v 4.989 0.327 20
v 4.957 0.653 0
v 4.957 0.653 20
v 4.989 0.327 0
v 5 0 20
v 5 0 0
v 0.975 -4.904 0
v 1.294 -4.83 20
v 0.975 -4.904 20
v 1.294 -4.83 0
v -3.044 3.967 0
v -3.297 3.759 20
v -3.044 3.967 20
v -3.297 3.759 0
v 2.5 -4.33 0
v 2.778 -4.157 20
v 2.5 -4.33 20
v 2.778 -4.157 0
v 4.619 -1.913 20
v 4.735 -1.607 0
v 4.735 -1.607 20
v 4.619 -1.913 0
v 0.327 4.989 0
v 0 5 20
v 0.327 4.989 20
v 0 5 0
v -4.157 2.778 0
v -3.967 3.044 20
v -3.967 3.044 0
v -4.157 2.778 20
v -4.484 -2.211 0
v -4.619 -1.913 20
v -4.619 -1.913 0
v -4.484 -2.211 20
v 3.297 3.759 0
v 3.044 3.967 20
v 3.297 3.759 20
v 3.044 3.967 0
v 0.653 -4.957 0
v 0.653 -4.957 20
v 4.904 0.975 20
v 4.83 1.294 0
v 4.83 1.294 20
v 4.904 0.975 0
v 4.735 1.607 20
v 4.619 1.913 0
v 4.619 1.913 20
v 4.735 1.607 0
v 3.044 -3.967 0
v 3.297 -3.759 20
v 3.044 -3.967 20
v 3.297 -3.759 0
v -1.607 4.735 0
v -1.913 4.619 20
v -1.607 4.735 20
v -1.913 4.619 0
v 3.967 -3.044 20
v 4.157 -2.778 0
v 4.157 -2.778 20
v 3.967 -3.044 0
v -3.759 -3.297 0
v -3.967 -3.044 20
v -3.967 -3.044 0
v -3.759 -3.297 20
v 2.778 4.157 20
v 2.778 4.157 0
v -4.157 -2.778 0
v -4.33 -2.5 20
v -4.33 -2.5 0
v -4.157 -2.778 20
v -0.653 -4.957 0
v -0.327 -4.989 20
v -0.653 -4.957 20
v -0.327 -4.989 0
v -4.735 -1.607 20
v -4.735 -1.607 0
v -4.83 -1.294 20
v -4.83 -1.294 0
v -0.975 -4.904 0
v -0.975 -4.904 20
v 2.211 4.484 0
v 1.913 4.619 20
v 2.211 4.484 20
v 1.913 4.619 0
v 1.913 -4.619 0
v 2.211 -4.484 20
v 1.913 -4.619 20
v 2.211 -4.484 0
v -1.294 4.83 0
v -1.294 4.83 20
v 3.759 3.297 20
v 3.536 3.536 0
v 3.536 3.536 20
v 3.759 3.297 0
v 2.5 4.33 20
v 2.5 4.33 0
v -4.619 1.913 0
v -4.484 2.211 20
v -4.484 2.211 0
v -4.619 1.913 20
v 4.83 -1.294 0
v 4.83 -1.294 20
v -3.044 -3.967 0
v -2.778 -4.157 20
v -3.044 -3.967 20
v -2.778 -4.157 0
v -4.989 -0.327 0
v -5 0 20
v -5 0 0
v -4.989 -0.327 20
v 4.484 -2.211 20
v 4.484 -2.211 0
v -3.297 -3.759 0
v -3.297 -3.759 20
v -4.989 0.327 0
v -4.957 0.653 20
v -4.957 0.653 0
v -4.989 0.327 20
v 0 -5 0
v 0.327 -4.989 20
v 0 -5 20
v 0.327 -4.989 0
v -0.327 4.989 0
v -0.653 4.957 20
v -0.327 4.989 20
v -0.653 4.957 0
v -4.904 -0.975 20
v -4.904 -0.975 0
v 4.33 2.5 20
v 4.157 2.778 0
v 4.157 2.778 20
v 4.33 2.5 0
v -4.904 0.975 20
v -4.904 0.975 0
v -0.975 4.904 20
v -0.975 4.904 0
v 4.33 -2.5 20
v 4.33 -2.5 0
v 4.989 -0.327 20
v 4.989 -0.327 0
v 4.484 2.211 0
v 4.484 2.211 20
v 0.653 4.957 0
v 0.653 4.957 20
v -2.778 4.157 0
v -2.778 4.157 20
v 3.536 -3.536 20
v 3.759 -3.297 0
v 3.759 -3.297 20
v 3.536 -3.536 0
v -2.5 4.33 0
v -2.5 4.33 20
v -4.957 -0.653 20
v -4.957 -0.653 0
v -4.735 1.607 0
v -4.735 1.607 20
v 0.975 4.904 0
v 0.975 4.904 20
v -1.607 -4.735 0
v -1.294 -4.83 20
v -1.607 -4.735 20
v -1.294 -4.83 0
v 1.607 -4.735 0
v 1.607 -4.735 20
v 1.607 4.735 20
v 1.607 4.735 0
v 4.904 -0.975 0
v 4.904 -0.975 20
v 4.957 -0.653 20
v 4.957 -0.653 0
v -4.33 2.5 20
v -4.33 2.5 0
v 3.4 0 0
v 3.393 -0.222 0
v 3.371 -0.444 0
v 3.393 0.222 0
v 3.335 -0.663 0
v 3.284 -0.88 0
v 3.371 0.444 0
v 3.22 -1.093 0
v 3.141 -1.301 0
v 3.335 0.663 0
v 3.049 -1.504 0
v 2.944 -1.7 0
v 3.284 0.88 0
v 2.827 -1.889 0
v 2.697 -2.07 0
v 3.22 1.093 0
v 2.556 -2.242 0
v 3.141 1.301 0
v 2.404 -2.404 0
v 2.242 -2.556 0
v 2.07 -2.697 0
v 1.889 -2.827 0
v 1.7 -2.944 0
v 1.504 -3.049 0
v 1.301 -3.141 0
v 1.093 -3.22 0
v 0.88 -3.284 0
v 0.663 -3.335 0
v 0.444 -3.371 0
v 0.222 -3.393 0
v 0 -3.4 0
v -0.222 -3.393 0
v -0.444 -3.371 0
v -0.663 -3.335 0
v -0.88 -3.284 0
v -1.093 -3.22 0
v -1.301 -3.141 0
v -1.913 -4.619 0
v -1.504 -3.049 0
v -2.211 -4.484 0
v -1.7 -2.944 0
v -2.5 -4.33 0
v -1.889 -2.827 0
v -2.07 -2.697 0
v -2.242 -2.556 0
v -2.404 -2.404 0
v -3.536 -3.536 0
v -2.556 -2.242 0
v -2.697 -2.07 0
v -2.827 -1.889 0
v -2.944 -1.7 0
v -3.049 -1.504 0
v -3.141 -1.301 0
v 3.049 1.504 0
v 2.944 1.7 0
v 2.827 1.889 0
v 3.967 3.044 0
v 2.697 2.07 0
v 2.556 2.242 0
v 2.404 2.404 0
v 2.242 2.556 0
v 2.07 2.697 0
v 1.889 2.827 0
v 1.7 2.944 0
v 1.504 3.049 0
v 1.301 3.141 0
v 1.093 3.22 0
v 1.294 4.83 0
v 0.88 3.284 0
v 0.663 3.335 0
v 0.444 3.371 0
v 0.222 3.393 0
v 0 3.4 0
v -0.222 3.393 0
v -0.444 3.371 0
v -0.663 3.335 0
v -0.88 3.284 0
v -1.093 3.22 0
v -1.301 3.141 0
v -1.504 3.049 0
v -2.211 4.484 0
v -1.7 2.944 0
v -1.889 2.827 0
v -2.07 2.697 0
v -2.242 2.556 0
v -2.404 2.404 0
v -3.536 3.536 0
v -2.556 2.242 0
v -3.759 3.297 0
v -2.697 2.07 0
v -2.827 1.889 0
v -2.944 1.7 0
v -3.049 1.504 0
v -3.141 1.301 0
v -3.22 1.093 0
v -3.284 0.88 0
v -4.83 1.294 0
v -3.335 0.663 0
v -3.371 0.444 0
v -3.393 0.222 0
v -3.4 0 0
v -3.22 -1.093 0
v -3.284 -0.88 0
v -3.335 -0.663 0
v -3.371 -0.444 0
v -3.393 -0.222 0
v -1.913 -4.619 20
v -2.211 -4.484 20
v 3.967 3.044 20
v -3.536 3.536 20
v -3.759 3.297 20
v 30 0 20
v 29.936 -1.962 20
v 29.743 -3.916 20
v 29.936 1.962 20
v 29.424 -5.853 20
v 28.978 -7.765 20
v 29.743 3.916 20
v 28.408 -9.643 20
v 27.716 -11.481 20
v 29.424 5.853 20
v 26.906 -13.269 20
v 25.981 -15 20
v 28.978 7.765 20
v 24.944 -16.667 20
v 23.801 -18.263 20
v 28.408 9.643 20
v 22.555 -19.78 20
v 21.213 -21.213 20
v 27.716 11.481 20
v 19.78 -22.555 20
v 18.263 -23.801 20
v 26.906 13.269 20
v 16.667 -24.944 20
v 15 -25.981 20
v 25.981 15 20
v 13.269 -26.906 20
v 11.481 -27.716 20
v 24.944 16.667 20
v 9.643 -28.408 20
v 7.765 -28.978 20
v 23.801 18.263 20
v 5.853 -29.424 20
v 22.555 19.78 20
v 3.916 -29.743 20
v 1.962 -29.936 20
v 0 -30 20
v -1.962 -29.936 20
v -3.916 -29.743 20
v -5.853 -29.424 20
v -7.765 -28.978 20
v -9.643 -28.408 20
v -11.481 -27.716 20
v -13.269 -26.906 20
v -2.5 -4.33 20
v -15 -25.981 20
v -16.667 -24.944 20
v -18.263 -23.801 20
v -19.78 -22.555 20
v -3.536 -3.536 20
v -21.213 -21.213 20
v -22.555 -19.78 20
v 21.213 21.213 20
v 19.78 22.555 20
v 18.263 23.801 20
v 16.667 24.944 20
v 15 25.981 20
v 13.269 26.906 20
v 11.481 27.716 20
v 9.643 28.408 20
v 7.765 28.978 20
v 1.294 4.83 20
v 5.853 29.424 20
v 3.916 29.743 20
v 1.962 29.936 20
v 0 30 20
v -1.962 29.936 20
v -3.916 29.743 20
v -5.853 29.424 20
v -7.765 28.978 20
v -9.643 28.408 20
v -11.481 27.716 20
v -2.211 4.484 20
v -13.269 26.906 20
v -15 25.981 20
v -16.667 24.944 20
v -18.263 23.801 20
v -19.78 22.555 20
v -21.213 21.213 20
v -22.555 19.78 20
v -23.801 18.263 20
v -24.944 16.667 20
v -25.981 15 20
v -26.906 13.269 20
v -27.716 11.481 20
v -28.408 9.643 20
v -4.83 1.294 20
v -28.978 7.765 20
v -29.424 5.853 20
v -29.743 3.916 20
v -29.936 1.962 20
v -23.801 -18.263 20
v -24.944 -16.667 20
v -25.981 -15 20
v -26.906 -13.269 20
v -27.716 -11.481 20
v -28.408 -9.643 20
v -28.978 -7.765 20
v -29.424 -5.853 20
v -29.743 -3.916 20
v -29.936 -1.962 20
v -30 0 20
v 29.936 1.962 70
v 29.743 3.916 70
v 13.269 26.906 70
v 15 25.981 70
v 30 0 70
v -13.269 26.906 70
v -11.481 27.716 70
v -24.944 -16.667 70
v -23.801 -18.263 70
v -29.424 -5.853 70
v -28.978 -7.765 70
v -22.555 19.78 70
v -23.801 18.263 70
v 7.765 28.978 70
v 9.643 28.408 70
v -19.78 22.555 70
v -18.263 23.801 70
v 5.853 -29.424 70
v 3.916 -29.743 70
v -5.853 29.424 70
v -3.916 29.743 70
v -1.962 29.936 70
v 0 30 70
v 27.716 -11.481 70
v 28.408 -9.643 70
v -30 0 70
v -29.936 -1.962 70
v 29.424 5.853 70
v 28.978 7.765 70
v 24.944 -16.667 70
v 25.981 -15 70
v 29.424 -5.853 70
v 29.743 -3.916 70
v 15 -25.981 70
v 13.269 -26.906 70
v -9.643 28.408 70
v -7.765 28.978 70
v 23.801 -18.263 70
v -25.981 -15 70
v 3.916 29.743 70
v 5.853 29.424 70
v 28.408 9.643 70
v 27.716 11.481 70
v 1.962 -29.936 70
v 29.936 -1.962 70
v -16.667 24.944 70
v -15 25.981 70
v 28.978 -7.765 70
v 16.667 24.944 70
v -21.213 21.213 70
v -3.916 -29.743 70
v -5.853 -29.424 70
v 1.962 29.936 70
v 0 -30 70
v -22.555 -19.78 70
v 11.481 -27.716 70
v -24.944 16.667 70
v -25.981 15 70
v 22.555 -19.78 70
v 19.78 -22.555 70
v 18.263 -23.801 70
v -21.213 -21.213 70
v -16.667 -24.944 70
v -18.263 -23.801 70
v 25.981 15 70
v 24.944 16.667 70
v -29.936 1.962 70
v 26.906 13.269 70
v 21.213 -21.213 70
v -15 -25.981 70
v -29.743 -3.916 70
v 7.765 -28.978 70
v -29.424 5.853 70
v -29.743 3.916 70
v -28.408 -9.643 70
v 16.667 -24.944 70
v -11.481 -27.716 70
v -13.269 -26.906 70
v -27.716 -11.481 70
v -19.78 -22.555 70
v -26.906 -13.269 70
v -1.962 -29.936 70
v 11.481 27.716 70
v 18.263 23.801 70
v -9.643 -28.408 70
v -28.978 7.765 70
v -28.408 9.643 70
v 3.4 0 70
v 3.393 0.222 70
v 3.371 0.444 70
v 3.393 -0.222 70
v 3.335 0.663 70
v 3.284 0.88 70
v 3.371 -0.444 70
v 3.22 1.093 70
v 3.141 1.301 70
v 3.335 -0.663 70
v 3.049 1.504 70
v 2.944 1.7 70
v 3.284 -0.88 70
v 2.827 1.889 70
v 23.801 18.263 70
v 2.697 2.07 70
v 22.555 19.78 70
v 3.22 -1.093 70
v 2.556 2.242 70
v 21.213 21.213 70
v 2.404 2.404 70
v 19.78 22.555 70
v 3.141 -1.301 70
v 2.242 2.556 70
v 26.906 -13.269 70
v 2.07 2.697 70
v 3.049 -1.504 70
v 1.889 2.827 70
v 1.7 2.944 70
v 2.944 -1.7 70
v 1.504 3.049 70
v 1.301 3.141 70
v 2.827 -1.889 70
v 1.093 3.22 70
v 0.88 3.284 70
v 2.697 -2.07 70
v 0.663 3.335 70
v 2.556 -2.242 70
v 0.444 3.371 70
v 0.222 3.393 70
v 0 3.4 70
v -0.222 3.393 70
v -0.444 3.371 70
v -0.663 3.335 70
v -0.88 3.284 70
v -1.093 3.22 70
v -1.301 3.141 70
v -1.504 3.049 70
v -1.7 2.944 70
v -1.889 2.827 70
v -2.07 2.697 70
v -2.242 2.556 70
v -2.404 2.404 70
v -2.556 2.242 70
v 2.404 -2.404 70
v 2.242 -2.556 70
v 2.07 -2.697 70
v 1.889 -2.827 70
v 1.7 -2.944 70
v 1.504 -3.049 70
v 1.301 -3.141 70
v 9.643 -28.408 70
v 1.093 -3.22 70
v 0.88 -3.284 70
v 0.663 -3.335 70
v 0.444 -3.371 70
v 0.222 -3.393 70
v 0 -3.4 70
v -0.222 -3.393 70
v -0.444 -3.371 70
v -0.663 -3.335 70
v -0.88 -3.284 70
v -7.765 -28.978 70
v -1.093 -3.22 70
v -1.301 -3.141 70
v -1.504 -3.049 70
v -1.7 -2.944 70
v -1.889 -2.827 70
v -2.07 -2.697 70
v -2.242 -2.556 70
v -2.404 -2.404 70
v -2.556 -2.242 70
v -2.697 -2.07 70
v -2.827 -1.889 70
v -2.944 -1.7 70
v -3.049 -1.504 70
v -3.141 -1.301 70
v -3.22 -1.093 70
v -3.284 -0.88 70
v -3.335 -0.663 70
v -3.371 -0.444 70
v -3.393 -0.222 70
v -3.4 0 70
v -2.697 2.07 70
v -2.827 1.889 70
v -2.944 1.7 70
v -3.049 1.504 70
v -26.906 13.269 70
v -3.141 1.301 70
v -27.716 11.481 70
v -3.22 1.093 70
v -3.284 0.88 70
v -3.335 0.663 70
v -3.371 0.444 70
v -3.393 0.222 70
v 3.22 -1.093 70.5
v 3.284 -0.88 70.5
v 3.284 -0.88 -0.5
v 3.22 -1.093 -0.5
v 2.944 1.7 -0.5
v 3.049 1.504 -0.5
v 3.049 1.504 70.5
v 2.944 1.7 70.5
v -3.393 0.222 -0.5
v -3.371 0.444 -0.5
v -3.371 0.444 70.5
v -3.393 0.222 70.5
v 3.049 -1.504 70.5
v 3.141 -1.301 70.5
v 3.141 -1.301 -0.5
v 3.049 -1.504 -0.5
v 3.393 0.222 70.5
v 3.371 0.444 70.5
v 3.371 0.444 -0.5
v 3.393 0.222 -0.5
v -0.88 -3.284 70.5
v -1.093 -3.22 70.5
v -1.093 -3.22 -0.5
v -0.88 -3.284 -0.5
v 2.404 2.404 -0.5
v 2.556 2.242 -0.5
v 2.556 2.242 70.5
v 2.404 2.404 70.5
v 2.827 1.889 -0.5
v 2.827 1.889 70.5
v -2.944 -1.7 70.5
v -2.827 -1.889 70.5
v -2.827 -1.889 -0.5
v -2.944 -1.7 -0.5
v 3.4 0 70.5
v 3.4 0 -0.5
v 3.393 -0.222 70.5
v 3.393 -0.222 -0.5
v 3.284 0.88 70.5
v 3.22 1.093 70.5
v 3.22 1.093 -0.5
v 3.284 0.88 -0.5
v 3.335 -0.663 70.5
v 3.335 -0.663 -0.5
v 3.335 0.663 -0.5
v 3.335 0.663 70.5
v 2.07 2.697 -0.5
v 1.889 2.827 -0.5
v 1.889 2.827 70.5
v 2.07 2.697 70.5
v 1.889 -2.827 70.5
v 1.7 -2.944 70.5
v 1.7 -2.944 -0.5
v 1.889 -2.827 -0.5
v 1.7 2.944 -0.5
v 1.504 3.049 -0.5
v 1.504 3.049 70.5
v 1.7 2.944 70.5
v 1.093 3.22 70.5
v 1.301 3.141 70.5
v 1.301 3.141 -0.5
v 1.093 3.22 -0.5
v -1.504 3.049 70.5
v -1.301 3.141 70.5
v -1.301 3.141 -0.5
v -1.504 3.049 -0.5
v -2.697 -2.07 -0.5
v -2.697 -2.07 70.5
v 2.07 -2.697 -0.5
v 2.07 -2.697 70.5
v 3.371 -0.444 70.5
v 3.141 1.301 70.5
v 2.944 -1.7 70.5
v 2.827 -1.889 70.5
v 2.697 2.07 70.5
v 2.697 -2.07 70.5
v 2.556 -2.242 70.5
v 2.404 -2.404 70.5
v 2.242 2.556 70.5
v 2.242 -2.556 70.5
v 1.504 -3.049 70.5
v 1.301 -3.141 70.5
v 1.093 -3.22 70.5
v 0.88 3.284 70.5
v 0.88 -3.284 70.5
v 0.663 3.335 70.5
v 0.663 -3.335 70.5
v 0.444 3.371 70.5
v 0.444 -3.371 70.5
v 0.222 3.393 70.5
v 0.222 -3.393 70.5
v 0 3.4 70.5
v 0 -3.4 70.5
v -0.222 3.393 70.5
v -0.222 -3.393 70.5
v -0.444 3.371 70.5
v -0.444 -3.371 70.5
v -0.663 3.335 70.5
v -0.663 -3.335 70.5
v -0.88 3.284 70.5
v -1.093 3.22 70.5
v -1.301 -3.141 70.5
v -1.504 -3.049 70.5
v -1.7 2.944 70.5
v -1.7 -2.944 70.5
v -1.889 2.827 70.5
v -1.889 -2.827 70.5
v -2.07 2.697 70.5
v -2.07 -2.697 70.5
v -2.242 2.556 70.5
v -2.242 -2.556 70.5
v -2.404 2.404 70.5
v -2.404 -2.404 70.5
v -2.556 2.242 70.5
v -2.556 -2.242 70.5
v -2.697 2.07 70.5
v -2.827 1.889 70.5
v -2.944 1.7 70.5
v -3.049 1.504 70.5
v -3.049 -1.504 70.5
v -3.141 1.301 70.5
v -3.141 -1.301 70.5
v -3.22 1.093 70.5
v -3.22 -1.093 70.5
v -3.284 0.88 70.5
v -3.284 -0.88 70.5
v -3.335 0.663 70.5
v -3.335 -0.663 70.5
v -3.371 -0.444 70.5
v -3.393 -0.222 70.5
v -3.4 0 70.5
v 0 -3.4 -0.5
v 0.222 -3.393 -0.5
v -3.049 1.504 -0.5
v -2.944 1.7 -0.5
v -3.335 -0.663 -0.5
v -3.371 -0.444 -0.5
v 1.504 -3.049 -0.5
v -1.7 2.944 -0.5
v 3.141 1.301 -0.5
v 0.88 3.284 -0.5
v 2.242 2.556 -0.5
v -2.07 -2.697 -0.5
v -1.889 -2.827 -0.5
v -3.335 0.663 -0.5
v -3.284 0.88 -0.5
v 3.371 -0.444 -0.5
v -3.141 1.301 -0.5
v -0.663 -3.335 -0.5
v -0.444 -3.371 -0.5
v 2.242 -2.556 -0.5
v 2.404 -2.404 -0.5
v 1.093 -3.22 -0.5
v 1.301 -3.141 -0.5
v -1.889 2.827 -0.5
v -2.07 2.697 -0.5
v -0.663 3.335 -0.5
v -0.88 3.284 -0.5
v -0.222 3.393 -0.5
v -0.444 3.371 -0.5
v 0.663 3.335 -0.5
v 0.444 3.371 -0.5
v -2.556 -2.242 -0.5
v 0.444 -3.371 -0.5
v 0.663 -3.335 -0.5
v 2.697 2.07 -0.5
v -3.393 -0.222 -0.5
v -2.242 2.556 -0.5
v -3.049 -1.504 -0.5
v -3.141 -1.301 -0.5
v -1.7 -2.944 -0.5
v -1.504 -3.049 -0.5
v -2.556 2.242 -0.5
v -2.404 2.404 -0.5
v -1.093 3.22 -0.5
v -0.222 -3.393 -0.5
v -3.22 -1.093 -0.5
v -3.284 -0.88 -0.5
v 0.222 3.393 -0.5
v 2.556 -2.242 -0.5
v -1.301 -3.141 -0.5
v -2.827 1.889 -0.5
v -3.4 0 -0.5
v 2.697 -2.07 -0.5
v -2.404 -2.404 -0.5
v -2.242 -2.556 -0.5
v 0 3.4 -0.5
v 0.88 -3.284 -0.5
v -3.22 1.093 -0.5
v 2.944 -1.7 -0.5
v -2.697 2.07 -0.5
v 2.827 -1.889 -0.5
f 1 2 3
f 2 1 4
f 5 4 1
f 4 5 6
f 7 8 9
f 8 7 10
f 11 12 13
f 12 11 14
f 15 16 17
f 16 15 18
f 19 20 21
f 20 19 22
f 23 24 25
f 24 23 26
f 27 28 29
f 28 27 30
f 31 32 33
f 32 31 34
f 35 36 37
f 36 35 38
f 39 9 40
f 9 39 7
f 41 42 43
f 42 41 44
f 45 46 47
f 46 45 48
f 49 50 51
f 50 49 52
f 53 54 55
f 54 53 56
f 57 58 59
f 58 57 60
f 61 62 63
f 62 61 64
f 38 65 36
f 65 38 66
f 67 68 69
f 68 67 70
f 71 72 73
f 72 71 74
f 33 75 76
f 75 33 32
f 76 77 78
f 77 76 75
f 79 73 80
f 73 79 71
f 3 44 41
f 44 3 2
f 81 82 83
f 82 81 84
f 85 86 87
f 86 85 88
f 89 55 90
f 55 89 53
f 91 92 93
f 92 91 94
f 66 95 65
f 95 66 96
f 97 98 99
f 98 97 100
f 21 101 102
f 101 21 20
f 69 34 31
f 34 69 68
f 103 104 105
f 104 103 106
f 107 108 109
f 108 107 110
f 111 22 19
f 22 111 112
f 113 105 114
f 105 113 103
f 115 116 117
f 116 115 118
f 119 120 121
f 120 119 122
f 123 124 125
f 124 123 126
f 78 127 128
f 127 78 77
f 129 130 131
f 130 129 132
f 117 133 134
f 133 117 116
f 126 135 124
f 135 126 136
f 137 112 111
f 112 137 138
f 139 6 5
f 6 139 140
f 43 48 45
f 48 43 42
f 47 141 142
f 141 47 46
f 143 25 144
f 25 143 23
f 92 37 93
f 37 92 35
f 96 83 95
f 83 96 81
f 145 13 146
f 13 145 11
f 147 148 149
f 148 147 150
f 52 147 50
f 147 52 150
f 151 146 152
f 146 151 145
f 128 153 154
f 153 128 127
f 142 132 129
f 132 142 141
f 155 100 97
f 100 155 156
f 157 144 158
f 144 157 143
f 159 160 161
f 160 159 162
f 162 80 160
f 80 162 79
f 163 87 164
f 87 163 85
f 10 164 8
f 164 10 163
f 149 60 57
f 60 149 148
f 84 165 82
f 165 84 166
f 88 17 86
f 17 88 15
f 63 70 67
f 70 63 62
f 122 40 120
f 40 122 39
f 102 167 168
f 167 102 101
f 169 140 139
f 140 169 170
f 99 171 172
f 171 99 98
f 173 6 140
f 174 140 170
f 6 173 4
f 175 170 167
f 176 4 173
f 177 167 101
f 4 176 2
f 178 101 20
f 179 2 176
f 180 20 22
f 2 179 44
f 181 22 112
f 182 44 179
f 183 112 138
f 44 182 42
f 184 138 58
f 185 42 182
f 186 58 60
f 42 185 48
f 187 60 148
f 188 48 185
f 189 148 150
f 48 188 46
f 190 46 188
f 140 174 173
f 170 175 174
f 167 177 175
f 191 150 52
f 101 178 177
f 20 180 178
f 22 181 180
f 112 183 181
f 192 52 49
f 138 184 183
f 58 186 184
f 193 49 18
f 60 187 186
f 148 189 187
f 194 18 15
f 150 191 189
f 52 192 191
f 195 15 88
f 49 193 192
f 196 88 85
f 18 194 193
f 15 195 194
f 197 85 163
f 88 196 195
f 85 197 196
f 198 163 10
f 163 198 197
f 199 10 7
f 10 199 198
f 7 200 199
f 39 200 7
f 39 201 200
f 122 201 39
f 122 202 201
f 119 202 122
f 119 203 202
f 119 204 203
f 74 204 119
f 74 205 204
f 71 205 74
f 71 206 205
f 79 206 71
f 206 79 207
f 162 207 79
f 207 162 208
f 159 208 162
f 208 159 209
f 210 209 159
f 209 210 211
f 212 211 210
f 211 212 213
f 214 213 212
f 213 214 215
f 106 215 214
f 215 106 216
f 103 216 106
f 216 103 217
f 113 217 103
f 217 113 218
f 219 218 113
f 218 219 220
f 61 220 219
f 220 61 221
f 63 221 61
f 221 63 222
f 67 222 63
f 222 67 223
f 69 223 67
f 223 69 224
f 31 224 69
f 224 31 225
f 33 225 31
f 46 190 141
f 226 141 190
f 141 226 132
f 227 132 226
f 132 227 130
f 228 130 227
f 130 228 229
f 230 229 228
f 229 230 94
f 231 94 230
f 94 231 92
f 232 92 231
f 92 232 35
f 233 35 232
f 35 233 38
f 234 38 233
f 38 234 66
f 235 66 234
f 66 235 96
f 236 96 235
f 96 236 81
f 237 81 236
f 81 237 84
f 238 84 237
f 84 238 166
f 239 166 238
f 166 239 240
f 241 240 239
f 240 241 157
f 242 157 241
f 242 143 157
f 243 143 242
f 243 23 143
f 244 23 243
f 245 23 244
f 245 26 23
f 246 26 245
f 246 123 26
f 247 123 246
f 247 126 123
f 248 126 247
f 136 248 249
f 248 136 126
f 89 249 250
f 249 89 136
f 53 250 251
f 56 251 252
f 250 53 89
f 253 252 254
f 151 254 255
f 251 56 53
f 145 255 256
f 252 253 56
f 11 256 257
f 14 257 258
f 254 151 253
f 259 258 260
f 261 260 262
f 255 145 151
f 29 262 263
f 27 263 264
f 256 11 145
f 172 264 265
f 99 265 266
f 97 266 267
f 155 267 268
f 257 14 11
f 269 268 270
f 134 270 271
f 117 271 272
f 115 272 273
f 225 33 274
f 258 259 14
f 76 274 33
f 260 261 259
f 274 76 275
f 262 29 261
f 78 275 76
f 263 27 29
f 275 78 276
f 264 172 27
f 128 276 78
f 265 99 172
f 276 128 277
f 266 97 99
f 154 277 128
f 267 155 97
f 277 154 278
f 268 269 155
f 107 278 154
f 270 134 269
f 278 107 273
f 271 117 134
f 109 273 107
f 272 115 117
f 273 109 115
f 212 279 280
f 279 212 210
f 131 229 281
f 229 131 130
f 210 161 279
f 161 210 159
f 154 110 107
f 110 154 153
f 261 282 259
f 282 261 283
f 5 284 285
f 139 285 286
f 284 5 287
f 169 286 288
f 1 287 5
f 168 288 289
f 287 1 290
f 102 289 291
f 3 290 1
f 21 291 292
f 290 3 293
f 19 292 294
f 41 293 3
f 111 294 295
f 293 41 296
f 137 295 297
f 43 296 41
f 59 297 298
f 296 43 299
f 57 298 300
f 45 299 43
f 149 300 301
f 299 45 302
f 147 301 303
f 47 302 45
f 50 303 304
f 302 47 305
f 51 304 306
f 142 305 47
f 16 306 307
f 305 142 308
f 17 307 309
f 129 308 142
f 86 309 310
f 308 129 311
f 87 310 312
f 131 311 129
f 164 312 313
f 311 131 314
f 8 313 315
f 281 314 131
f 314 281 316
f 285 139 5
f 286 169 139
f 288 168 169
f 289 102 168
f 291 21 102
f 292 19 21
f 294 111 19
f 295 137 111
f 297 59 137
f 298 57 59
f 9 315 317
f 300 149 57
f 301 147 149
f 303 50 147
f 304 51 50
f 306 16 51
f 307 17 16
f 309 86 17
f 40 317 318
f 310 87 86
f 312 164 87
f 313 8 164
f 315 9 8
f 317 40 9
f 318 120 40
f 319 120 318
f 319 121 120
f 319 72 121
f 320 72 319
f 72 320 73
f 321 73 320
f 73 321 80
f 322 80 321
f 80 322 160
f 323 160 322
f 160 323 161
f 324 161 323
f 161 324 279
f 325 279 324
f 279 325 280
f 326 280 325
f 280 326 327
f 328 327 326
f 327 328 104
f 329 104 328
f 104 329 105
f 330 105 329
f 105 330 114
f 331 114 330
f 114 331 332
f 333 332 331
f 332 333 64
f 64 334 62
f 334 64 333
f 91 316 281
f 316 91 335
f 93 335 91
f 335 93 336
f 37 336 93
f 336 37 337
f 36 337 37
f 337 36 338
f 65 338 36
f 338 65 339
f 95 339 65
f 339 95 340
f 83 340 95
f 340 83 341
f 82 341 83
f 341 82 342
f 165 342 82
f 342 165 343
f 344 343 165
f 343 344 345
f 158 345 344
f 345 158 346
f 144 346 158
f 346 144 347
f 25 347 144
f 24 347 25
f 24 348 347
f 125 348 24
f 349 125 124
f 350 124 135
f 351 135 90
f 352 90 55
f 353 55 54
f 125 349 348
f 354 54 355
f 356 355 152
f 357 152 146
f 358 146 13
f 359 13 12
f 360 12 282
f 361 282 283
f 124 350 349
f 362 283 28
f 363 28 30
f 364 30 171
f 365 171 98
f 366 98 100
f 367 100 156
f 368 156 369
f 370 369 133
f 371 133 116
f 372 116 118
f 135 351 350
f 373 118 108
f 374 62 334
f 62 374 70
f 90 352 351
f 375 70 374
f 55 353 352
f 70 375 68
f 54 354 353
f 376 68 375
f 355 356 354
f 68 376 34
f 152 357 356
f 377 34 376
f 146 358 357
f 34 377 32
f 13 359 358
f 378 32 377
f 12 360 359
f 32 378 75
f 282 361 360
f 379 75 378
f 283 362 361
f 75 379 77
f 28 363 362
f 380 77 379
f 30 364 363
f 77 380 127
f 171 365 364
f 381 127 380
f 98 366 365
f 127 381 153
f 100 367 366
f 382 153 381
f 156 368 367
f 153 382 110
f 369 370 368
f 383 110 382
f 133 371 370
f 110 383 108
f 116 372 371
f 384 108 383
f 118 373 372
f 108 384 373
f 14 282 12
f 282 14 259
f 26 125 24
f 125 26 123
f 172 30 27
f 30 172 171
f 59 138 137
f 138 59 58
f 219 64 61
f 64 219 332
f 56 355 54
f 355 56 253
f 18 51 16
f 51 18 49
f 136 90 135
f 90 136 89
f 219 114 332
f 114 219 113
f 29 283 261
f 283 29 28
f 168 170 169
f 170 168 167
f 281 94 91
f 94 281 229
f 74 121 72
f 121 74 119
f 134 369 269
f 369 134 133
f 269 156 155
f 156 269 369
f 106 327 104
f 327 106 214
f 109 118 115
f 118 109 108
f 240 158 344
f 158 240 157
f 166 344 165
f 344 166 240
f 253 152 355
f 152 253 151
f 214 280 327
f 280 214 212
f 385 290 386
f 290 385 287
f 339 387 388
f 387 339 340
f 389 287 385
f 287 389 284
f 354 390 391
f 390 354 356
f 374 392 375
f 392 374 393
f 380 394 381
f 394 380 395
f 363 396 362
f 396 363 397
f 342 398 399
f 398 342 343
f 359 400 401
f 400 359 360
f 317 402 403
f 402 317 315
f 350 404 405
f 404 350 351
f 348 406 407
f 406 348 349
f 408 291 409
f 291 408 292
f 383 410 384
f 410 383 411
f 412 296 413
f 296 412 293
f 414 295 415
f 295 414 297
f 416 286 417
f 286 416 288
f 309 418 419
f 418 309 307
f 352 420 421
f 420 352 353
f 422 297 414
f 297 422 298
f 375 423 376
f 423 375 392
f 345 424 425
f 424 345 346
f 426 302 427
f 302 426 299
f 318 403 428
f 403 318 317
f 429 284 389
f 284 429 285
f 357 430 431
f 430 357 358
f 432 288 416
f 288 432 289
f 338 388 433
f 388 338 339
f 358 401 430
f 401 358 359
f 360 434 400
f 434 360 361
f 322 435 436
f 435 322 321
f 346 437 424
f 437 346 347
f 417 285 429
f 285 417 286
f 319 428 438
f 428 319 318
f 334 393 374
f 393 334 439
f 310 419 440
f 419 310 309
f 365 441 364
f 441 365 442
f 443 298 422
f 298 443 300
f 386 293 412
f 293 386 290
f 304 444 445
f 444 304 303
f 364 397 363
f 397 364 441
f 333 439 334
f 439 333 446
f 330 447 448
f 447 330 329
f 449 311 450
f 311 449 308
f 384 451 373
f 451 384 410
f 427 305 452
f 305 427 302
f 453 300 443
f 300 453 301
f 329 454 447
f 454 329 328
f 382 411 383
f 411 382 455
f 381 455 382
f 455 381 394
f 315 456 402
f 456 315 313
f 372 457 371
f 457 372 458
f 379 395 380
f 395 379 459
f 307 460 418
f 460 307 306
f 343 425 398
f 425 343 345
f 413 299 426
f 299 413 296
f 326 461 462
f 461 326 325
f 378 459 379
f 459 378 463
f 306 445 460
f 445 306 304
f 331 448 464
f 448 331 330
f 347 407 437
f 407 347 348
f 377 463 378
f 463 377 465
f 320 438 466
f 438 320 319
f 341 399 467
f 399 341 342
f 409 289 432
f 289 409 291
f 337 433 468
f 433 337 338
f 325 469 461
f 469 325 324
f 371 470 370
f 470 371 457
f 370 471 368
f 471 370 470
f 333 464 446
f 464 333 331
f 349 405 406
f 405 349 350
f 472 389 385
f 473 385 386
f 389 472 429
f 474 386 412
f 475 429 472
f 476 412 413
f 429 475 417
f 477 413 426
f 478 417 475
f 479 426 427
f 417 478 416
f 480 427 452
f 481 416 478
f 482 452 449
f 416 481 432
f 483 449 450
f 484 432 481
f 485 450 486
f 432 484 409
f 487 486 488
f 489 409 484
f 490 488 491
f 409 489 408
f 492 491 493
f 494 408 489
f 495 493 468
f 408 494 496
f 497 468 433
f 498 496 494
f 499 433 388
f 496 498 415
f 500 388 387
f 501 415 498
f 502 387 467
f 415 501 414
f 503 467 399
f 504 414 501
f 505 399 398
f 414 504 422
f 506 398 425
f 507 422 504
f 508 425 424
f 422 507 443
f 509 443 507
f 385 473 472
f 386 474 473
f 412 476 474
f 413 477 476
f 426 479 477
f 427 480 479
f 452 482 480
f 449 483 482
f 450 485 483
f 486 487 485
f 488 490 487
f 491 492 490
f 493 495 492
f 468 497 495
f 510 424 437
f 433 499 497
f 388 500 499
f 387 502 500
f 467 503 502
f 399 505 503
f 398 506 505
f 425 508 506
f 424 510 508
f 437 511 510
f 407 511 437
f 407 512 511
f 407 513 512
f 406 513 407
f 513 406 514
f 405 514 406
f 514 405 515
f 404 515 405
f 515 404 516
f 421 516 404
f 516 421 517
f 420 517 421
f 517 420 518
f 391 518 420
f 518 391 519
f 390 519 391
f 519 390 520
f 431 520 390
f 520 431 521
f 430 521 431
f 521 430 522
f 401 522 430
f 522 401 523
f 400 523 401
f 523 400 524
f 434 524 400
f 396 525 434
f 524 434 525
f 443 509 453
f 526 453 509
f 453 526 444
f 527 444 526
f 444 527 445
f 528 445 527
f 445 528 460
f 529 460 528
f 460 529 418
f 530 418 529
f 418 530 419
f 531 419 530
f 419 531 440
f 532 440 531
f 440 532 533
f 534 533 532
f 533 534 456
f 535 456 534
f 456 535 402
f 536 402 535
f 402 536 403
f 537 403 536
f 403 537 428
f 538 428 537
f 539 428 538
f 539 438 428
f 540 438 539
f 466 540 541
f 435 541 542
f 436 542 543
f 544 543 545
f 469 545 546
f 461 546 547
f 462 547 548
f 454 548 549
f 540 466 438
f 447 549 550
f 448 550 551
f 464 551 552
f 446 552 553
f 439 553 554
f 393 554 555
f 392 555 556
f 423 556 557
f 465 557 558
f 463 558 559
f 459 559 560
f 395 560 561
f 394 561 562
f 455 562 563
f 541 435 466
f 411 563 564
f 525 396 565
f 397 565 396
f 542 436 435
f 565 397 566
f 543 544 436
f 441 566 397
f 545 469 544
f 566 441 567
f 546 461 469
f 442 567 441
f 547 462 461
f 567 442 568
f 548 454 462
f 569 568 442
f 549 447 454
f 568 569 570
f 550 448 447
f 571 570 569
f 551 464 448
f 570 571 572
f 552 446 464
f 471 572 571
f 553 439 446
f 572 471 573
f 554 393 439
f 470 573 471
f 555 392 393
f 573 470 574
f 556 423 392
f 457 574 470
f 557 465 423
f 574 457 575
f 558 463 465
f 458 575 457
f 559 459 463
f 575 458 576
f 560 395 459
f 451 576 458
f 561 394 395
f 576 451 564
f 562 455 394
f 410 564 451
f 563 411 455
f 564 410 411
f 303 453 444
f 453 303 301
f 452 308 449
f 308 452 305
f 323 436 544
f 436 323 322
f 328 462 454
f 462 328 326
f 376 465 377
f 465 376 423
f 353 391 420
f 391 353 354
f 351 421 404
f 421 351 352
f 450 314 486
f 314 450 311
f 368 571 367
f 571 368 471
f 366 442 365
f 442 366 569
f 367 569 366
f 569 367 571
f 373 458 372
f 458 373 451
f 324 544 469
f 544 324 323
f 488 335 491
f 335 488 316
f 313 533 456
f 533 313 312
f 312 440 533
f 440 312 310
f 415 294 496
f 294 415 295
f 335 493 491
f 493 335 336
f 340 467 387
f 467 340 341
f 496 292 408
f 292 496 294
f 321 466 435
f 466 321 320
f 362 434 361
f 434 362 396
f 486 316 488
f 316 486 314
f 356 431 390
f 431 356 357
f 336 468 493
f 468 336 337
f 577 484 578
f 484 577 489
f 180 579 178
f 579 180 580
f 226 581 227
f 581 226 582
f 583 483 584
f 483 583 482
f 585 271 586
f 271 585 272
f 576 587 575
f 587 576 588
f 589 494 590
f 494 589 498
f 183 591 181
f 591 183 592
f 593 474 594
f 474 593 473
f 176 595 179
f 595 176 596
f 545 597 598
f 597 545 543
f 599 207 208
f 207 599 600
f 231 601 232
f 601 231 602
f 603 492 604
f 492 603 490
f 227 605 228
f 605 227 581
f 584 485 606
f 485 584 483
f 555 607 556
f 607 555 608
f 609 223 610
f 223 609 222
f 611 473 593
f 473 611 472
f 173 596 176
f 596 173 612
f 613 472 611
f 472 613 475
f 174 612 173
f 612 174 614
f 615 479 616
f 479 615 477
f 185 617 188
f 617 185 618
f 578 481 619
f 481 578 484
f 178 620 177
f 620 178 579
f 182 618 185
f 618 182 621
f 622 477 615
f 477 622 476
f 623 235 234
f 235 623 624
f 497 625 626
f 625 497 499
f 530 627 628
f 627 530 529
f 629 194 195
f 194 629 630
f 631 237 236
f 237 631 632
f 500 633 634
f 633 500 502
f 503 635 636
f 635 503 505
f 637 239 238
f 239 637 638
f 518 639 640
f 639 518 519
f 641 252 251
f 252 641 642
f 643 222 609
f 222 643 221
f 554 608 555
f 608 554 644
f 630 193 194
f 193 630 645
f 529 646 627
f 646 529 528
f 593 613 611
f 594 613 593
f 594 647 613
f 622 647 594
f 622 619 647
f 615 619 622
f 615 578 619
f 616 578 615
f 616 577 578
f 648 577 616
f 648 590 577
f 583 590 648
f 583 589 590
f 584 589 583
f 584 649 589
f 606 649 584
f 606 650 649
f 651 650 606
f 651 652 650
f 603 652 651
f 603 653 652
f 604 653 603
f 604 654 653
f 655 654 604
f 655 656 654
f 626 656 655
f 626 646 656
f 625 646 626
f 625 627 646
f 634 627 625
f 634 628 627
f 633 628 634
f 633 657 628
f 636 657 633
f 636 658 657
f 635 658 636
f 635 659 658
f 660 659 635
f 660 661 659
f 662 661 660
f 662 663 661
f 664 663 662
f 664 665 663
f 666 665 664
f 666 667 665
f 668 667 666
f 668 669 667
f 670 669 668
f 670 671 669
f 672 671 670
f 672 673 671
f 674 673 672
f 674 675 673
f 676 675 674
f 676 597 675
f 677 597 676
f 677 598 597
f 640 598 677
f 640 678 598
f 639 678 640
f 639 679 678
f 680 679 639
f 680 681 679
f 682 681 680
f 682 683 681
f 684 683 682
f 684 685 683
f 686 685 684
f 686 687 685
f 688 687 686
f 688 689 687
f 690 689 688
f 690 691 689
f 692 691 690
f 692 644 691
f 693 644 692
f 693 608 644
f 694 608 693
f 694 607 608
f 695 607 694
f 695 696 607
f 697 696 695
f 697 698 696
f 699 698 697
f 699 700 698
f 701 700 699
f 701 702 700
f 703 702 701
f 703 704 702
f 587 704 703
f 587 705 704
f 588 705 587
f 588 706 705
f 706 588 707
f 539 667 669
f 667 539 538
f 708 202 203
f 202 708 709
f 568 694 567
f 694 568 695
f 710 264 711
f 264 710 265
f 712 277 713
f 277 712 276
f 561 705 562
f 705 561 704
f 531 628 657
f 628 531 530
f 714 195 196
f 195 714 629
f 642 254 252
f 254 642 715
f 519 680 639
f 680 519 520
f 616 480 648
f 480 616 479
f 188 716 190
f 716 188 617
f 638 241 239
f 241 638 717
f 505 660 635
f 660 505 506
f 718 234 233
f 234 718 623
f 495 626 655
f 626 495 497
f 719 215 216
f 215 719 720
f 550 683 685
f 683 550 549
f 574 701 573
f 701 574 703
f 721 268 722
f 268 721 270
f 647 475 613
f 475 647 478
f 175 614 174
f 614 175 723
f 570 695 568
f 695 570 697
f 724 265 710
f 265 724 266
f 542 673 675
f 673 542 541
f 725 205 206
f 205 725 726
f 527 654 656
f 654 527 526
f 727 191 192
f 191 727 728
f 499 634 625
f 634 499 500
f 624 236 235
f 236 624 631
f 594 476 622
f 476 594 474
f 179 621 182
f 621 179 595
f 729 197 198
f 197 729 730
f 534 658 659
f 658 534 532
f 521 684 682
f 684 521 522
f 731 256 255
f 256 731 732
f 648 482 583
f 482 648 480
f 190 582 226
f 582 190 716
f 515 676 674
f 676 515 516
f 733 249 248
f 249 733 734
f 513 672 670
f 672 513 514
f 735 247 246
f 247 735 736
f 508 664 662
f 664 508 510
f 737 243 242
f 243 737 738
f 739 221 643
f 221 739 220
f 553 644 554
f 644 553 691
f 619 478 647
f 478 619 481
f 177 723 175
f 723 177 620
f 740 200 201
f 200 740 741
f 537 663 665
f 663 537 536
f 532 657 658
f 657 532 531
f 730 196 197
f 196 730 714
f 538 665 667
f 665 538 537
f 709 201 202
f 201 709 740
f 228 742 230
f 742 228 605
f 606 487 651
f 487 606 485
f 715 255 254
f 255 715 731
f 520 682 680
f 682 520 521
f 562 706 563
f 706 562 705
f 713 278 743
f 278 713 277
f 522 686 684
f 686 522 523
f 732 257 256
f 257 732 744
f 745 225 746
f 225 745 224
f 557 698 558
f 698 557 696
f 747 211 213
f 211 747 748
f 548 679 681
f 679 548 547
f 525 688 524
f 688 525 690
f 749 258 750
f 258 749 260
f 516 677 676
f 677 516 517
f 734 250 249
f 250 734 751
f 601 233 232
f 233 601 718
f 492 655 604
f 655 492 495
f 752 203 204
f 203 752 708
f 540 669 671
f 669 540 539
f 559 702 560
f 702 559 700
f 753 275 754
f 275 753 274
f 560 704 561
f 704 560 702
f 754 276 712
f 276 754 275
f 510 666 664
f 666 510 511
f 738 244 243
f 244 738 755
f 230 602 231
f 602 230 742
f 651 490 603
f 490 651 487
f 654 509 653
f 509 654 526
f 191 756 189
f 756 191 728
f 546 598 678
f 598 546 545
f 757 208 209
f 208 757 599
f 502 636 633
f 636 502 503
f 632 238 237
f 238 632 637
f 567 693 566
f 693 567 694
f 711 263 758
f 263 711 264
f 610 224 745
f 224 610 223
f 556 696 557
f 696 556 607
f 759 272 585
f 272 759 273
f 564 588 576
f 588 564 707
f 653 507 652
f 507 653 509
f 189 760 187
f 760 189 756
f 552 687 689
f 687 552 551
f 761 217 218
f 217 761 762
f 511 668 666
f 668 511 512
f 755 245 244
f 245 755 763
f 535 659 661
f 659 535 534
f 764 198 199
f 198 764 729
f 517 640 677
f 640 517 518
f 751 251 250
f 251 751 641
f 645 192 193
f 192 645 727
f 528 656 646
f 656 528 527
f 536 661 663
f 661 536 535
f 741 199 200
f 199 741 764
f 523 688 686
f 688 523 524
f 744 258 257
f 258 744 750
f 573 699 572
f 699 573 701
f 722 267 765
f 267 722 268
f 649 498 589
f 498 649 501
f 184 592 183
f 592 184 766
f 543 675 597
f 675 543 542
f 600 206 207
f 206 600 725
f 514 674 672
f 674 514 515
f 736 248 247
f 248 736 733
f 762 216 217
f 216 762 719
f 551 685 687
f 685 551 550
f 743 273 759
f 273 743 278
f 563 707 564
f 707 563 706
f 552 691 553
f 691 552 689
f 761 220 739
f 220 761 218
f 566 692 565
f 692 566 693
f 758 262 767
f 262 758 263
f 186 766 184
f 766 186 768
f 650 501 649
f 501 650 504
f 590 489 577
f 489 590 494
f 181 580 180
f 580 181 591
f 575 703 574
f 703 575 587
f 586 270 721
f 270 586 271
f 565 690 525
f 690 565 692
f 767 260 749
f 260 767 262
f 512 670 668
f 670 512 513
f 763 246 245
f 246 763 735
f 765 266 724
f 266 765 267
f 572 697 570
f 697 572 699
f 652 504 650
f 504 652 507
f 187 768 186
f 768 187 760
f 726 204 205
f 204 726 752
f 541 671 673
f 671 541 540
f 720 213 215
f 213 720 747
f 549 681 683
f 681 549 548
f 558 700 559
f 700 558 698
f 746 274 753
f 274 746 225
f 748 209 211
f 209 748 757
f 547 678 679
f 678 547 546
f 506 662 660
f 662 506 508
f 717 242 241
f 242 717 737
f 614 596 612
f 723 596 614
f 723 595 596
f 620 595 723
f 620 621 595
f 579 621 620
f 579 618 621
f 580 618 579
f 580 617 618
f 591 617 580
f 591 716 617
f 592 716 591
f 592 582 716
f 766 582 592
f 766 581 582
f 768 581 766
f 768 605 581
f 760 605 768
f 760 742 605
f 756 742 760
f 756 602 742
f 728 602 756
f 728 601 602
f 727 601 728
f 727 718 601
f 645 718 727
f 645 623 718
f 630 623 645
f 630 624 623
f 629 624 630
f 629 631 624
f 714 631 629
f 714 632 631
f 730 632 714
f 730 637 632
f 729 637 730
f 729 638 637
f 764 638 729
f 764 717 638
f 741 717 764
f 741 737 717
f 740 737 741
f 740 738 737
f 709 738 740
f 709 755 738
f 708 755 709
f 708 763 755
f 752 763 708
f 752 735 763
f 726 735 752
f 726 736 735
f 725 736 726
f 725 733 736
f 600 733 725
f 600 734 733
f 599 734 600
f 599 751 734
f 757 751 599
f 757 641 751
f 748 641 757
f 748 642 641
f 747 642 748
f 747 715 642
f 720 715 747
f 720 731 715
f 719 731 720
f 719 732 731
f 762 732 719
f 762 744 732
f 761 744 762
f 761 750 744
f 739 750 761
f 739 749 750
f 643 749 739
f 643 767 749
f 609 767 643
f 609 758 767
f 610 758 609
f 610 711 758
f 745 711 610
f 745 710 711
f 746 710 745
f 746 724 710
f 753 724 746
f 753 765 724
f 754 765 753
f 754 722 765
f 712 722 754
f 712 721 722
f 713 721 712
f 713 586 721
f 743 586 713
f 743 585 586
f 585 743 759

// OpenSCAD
// Funnel with straight spout - printed upright, open top and bottom
// Units: mm. Wall thickness: 1.6 mm.

// ---- Parameters ----
spout_d      = 10;     // spout outer diameter
spout_bore   = spout_d - 2 * 1.6;  // spout bore (6.8 mm)
spout_h      = 20;     // spout length (z = 0 to 20)
cone_d1      = 10;     // cone outer diameter at spout top (z = 20)
cone_d2      = 60;     // cone outer diameter at rim (z = 50)
cone_h       = cone_d2 - cone_d1;  // cone height (40 mm)
wall         = 1.6;    // wall thickness
eps          = 0.5;    // cutter overshoot past faces

$fn = 96;

// ---- Model ----
union() {
    // Spout (tube)
    translate([0, 0, 0])
        cylinder(d = spout_d, h = spout_h);

    // Cone (wider at top, narrower at bottom)
    translate([0, 0, spout_h])
        linear_extrude(height = cone_h)
            circle(d = cone_d2, $fn = 96);
}

// Cut the bore through the full length so liquid runs straight through
translate([0, 0, -eps])
    cylinder(d = spout_bore, h = spout_h + cone_h + 2 * eps);
